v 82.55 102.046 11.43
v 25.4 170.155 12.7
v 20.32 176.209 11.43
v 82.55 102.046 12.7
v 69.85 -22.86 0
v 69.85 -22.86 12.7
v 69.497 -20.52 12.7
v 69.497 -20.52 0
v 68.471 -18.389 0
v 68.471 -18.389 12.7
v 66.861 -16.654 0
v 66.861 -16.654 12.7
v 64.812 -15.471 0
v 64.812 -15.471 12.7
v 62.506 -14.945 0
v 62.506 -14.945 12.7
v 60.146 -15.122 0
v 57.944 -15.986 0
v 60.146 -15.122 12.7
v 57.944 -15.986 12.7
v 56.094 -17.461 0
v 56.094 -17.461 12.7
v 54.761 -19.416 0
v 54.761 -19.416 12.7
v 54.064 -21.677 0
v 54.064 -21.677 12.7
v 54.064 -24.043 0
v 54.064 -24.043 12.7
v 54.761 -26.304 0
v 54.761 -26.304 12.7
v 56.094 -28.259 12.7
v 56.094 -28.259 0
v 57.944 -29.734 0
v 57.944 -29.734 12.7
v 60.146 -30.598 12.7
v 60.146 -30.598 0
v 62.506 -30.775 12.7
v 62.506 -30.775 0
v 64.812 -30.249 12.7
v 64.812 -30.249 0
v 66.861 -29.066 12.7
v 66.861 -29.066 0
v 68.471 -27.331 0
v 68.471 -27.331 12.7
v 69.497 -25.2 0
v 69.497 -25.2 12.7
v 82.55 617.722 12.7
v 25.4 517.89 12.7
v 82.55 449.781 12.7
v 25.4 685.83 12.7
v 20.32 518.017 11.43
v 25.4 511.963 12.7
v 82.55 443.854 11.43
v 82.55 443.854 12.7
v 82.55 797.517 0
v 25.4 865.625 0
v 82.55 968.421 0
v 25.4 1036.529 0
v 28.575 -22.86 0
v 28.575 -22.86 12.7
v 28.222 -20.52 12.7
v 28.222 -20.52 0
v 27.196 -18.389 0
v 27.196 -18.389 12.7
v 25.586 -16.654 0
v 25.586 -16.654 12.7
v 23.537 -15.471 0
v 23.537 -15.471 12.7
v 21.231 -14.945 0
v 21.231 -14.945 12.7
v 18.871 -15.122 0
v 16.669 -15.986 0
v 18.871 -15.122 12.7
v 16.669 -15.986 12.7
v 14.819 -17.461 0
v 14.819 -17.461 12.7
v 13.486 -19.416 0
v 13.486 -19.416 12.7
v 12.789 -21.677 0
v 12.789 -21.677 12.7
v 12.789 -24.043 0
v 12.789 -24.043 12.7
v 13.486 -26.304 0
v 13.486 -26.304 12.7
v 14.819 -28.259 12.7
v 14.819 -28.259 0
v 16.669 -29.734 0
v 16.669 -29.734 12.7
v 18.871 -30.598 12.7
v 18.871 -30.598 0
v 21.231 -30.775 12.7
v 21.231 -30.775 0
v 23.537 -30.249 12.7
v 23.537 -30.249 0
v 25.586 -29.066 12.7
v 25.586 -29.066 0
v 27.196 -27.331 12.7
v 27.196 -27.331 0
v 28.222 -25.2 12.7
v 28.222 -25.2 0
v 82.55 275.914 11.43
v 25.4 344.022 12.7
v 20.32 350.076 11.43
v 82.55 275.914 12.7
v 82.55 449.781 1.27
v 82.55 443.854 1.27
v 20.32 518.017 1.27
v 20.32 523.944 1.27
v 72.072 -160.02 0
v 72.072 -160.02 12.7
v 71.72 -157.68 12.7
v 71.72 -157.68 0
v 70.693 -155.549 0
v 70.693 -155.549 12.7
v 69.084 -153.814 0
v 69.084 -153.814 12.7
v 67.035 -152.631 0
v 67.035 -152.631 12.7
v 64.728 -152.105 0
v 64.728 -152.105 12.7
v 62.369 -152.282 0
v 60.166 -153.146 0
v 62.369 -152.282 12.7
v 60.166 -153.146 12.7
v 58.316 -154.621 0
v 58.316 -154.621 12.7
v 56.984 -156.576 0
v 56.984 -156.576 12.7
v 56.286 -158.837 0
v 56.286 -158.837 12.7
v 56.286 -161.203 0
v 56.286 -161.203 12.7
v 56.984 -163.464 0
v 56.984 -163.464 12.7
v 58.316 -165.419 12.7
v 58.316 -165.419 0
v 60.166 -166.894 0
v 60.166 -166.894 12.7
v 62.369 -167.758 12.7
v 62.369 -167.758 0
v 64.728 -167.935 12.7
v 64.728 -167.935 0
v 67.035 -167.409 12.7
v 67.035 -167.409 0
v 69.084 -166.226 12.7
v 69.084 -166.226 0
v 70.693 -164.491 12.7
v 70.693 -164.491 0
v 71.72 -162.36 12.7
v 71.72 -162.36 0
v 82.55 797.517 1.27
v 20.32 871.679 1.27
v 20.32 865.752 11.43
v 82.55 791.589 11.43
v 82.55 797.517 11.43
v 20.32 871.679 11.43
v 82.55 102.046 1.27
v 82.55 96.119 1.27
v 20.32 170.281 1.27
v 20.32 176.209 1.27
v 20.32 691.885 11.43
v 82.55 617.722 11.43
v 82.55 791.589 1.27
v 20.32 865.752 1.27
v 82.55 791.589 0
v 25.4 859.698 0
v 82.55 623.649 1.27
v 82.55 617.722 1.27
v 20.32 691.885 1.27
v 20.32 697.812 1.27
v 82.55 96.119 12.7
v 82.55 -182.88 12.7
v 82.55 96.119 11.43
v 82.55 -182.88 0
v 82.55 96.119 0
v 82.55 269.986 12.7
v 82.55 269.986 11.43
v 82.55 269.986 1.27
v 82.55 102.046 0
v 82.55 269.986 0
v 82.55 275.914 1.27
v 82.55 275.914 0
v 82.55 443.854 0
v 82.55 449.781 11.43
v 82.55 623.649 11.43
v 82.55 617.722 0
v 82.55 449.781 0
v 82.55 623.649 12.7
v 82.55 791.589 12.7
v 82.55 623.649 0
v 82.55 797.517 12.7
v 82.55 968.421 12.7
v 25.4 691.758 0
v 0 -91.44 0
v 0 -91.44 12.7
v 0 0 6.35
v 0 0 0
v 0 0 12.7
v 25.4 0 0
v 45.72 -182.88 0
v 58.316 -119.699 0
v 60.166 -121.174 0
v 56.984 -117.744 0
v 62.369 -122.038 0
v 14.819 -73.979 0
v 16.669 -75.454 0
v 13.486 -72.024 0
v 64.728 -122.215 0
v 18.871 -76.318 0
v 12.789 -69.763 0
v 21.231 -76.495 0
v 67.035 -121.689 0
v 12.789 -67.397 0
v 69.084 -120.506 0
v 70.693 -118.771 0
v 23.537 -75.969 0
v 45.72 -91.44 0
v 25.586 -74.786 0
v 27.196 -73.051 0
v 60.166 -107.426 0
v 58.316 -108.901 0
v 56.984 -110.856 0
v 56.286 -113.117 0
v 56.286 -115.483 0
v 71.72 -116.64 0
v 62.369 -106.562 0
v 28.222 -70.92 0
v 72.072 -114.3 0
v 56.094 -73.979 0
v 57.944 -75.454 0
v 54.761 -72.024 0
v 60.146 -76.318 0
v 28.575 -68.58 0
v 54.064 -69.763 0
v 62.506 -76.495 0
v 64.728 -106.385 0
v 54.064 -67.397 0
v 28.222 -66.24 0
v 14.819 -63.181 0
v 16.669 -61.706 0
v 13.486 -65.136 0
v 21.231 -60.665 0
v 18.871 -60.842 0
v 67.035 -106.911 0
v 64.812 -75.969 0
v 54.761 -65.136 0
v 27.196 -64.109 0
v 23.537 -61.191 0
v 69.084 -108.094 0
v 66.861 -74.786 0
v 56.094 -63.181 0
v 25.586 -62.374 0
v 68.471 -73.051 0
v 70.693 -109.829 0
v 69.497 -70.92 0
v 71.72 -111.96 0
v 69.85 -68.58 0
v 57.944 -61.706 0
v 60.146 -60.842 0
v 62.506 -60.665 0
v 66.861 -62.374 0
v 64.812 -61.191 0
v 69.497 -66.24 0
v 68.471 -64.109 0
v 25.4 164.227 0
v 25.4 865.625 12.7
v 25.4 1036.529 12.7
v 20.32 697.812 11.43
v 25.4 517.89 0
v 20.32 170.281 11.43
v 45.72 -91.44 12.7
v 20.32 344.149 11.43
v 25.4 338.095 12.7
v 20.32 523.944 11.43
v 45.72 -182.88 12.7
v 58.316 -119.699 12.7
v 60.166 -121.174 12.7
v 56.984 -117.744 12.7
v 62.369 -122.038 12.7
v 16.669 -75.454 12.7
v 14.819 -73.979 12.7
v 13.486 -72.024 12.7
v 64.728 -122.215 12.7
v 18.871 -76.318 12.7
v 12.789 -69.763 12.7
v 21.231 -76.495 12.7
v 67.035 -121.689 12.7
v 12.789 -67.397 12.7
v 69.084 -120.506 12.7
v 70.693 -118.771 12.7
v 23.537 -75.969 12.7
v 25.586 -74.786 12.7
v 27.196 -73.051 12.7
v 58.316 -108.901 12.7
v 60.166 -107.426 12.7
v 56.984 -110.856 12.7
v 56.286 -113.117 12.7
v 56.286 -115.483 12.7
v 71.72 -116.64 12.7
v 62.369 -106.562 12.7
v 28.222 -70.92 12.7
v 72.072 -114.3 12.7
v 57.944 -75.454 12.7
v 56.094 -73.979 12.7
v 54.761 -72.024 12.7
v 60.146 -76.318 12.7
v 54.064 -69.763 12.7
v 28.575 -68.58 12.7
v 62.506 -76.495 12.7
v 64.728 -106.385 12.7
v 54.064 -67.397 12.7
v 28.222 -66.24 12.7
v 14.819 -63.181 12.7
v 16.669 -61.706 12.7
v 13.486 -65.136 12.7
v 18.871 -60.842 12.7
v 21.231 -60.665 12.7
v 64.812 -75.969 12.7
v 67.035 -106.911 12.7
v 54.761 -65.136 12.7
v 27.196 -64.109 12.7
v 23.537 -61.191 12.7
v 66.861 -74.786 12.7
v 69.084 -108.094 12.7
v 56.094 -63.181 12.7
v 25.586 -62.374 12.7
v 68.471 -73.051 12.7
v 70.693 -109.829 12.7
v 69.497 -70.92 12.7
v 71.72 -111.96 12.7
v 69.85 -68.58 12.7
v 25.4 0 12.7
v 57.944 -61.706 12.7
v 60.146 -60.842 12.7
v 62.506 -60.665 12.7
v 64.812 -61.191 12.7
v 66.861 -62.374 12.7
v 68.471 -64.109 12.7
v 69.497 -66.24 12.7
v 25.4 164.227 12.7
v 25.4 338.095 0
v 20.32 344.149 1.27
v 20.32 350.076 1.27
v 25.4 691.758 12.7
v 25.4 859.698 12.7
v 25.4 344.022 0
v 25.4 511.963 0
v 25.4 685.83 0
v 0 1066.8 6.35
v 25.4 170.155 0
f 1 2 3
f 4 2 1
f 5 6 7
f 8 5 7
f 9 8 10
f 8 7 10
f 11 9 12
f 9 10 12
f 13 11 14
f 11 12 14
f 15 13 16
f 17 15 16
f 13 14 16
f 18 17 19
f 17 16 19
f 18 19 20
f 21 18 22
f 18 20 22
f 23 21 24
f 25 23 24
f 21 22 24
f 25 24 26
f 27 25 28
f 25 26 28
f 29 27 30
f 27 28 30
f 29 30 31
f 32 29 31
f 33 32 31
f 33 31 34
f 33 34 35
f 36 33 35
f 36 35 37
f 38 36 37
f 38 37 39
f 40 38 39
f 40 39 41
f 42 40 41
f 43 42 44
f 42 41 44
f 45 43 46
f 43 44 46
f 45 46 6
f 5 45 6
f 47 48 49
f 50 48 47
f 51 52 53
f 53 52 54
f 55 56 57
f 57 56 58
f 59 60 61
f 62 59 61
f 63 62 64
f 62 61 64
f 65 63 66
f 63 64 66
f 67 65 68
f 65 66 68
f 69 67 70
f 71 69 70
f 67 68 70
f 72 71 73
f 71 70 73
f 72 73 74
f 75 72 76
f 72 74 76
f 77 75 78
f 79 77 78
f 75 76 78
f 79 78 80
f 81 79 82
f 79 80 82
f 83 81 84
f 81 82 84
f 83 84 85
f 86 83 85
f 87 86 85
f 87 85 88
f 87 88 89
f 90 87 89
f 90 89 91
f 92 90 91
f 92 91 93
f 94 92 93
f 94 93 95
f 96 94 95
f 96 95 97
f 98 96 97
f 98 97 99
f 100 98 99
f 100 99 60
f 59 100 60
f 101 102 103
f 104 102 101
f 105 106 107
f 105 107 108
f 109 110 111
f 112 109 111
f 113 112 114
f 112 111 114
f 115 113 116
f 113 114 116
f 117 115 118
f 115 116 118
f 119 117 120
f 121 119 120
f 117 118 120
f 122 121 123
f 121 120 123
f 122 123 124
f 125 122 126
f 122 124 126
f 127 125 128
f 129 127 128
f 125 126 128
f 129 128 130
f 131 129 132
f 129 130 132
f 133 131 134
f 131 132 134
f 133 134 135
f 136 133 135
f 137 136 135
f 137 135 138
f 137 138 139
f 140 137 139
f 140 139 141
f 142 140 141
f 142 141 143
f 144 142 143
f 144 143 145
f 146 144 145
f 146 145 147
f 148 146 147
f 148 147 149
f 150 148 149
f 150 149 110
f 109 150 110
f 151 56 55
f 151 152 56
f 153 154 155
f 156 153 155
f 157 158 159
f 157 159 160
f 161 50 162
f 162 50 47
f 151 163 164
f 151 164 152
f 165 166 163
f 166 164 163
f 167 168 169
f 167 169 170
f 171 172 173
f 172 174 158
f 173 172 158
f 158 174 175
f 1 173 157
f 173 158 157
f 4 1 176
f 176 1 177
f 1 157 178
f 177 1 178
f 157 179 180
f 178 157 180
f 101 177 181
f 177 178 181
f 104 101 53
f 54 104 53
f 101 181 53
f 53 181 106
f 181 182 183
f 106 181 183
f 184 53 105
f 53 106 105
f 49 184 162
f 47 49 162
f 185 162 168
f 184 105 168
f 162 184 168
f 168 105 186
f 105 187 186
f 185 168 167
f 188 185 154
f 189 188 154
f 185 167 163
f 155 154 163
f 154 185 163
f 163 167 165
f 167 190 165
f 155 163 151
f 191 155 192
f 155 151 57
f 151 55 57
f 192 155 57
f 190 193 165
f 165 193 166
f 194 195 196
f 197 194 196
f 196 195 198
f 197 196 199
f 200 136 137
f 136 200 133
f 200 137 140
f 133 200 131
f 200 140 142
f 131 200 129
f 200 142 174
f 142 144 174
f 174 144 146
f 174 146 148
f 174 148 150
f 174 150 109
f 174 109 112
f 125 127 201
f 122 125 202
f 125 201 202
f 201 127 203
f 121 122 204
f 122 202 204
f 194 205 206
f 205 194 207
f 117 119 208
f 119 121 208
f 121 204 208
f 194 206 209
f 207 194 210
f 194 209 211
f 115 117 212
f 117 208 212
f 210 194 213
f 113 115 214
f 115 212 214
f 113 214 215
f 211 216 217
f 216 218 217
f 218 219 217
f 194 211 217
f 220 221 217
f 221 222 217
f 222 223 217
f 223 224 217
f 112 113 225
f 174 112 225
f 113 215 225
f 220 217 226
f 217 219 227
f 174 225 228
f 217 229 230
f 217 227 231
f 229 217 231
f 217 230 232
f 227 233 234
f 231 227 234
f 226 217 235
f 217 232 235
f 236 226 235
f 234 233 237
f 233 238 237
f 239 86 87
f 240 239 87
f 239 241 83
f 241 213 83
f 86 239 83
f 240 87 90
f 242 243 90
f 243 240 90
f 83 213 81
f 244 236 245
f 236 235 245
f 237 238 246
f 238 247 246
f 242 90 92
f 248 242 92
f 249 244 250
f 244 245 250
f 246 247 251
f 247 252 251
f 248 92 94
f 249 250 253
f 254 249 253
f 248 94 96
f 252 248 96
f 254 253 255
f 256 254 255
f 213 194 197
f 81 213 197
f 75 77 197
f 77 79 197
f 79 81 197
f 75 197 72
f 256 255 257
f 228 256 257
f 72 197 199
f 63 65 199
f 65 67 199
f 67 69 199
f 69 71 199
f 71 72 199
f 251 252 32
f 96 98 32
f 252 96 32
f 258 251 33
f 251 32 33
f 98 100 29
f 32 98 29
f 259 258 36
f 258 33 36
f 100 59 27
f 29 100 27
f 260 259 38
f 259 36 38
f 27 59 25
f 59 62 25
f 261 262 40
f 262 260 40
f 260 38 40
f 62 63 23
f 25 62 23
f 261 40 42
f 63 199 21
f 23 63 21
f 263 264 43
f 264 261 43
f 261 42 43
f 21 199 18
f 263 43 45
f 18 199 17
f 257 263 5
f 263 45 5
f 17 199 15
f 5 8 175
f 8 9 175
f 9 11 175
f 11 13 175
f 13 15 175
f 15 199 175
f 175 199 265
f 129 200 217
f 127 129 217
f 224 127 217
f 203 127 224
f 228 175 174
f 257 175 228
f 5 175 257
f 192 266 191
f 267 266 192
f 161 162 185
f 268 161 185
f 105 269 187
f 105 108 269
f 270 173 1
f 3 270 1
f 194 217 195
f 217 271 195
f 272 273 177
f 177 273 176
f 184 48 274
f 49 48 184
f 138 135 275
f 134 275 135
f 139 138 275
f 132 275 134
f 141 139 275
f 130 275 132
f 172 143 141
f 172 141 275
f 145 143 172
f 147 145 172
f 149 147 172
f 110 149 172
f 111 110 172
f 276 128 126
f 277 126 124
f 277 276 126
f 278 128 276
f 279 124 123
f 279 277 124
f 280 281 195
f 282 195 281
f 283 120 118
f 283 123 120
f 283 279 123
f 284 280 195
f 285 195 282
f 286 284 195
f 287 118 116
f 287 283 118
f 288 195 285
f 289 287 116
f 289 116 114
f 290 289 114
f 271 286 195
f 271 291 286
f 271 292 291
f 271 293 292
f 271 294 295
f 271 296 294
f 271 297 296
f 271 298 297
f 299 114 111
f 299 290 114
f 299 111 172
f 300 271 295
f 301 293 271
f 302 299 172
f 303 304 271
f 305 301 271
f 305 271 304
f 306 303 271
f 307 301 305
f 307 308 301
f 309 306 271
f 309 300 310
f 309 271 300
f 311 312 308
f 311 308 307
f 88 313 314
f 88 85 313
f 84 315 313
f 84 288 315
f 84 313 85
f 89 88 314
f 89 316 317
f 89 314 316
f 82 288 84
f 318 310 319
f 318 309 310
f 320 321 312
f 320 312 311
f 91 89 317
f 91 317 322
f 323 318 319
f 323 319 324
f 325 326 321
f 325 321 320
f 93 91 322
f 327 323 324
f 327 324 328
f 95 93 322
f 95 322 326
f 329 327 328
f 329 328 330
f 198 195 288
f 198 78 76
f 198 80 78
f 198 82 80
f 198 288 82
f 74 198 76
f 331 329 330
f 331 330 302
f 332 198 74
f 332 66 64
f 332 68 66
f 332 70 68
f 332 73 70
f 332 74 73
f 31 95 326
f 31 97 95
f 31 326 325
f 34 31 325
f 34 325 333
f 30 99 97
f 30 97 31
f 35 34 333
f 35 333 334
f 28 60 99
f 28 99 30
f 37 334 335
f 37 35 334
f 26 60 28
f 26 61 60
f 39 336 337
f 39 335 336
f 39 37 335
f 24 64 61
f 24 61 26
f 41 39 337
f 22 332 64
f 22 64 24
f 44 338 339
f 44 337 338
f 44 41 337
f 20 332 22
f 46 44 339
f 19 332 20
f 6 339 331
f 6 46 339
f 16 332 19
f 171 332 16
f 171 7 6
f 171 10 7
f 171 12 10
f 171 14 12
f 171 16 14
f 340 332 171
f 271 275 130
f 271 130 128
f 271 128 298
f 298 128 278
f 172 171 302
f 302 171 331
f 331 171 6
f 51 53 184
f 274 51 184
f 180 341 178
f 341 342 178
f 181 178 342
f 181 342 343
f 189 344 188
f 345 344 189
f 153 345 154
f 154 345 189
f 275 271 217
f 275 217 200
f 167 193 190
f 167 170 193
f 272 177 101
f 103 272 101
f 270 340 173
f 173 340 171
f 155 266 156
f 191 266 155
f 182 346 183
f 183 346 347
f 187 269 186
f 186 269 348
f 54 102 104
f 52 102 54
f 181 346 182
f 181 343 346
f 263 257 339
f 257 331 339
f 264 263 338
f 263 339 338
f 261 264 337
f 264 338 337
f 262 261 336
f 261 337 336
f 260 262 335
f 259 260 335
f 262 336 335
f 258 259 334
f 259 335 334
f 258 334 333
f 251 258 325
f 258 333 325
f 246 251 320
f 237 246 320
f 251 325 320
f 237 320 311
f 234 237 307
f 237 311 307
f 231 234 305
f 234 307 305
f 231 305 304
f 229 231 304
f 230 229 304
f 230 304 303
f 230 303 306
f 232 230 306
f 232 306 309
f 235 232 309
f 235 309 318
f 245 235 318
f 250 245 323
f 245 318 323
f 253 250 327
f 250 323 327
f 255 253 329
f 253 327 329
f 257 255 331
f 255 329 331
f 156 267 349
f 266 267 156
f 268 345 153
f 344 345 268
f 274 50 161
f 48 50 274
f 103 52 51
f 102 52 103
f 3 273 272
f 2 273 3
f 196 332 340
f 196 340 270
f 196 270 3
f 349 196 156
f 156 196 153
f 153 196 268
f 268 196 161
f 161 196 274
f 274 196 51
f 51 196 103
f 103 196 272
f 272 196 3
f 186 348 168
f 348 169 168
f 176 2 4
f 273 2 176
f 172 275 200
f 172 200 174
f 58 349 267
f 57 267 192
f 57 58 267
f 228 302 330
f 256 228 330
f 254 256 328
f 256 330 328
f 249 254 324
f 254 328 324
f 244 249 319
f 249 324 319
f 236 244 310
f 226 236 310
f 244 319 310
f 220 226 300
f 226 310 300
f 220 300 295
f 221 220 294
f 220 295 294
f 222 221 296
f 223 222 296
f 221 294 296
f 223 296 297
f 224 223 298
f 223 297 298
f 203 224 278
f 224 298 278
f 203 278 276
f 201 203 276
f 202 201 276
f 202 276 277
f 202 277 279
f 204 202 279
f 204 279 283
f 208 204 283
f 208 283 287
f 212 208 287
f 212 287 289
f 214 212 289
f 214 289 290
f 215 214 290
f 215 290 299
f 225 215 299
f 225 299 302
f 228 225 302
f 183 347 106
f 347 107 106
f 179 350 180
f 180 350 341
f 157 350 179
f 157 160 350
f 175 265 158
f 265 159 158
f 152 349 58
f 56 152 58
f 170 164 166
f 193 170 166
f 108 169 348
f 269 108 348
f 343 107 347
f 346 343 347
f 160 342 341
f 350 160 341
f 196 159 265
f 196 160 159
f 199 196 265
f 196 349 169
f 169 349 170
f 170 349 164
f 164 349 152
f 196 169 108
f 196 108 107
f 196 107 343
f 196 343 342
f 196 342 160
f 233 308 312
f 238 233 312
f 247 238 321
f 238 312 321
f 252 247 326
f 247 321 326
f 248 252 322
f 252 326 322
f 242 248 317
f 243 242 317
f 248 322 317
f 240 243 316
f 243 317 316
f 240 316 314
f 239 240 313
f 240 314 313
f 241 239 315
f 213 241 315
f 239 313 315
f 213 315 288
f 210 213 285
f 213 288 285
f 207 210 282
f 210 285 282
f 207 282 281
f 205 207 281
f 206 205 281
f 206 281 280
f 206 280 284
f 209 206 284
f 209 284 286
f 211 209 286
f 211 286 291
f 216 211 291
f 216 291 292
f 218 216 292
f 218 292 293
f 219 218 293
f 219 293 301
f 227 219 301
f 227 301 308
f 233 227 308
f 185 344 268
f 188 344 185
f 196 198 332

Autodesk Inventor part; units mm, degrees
ref_plane "YZ Plane" through (0, 0, 0) normal (1, 0, 0) x (0, 1, 0)
ref_plane "XZ Plane" through (0, 0, 0) normal (0, 1, 0) x (-1, 0, 0)
ref_plane "XY Plane" through (0, 0, 0) normal (0, 0, 1) x (1, 0, 0)
sketch "Sketch1" plane through (0, 0, 0) normal (0, 0, 1) x (1, 0, 0)
  line L0 (0, 0) -> (82.55, 0)
  line L1 (82.55, 0) -> (82.55, 968.4207)
  line L2 (82.55, 968.4207) -> (82.55, 804.8513)
  line L3 (82.55, 804.8513) -> (82.55, 621.9713)
  line L4 (82.55, 621.9713) -> (82.55, 439.0913)
  line L5 (82.55, 439.0913) -> (82.55, 256.2113)
  line L6 (82.55, 256.2113) -> (82.55, 73.3313)
  line L7 (0, 1066.8) -> (0, 0)
  line L8 (0, 1066.8) -> (82.55, 968.4207)
  line L9 (-23.6845, 1095.0261) -> (784.1067, 132.338)
  line L10 (-109.2976, 1023.1881) -> (698.4936, 60.5001)
  line L11 (-194.9107, 951.3502) -> (612.8804, -11.3378)
  line L12 (-280.5239, 879.5122) -> (527.2673, -83.1758)
  line L13 (-366.137, 807.6743) -> (441.6542, -155.0137)
  line L14 (-451.7501, 735.8363) -> (356.041, -226.8517)
  dimension "d26" = 1066.8
  dimension "d27" = 82.55
  dimension "d28" = 40
  dimension "d34" = 111.76
  dimension "d35" = 111.76
  dimension "d36" = 111.76
  dimension "d37" = 111.76
  dimension "d38" = 111.76
extrude "Extrusion1" add sketch "Sketch1" along normal blind 12.7
sketch "Sketch2" plane through (0, 0, 12.7) normal (0, 0, 1) x (1, 0, 0)
  line L0 (0, 0) -> (82.55, 0)
  line L1 (82.55, 0) -> (82.55, 968.4207)
  line L2 (82.55, 968.4207) -> (82.55, 804.8513)
  line L3 (82.55, 804.8513) -> (82.55, 621.9713)
  line L4 (82.55, 621.9713) -> (82.55, 439.0913)
  line L5 (82.55, 439.0913) -> (82.55, 256.2113)
  line L6 (82.55, 256.2113) -> (82.55, 73.3313)
  line L7 (0, 1066.8) -> (0, 0)
  line L8 (0, 1066.8) -> (82.55, 968.4207)
  line L9 (-23.6845, 1095.0261) -> (784.1067, 132.338)
  line L10 (-109.2976, 1023.1881) -> (698.4936, 60.5001)
  line L11 (-194.9107, 951.3502) -> (612.8804, -11.3378)
  line L12 (-280.5239, 879.5122) -> (527.2673, -83.1758)
  line L13 (-366.137, 807.6743) -> (441.6542, -155.0137)
  line L14 (-451.7501, 735.8363) -> (356.041, -226.8517)
  line L15 (-453.2094, 734.6118) -> (354.5817, -228.0762)
  line L16 (-450.2908, 737.0609) -> (357.5004, -225.6272)
  line L17 (-367.5963, 806.4498) -> (440.1949, -156.2382)
  line L18 (-364.6777, 808.8988) -> (443.1135, -153.7892)
  line L19 (-281.9832, 878.2877) -> (525.808, -84.4003)
  line L20 (-279.0645, 880.7367) -> (528.7266, -81.9513)
  line L21 (-196.37, 950.1257) -> (611.4211, -12.5624)
  line L22 (-193.4514, 952.5747) -> (614.3397, -10.1133)
  line L23 (-110.7569, 1021.9636) -> (697.0342, 59.2756)
  line L24 (-107.8383, 1024.4126) -> (699.9529, 61.7246)
  point P0 (0, 889.9687)
  point P1 (82.55, 791.5894)
  point P2 (82.55, 797.5167)
  point P3 (0, 895.896)
  point P4 (0, 716.101)
  point P5 (82.55, 617.7217)
  point P6 (82.55, 623.649)
  point P7 (0, 722.0283)
  point P8 (0, 542.2333)
  point P9 (82.55, 443.854)
  point P10 (82.55, 449.7813)
  point P11 (0, 548.1606)
  point P12 (0, 368.3656)
  point P13 (82.55, 269.9863)
  point P14 (82.55, 275.9136)
  point P15 (0, 374.2929)
  point P16 (0, 194.4979)
  point P17 (82.55, 96.1186)
  point P18 (82.55, 102.0459)
  point P19 (0, 200.4252)
  dimension "d41" = 1066.8
  dimension "d42" = 82.55
  dimension "d43" = 40
  dimension "d44" = 111.76
  dimension "d45" = 111.76
  dimension "d46" = 111.76
  dimension "d47" = 111.76
  dimension "d48" = 111.76
  dimension "d49" = 1.905
  dimension "d50" = 1.905
  dimension "d51" = 1.905
  dimension "d52" = 1.905
  dimension "d53" = 1.905
  dimension "d54" = 1.905
  dimension "d55" = 1.905
  dimension "d56" = 1.905
  dimension "d57" = 1.905
  dimension "d58" = 1.905
extrude "Extrusion2" cut sketch "Sketch2" against normal blind 12.7 contours L7 L14 L1 L15 | L7 L16 L1 L14 | L7 L13 L1 L17 | L7 L18 L1 L13 | L7 L12 L1 L19 | L7 L20 L1 L12 | L7 L11 L1 L21 | L7 L22 L1 L11 | L7 L10 L1 L23 | L7 L24 L1 L10
sketch "Sketch3" plane through (0, 0, 12.7) normal (0, 0, 1) x (1, 0, 0)
  line L0 (0, 0) -> (82.55, 0)
  line L1 (82.55, 0) -> (82.55, 968.4207)
  line L2 (82.55, 968.4207) -> (82.55, 804.8513)
  line L3 (82.55, 804.8513) -> (82.55, 621.9713)
  line L4 (82.55, 621.9713) -> (82.55, 439.0913)
  line L5 (82.55, 439.0913) -> (82.55, 256.2113)
  line L6 (82.55, 256.2113) -> (82.55, 73.3313)
  line L7 (0, 1066.8) -> (0, 0)
  line L8 (0, 1066.8) -> (82.55, 968.4207)
  line L9 (-23.6845, 1095.0261) -> (784.1067, 132.338)
  line L10 (-109.2976, 1023.1881) -> (698.4936, 60.5001)
  line L11 (-194.9107, 951.3502) -> (612.8804, -11.3378)
  line L12 (-280.5239, 879.5122) -> (527.2673, -83.1758)
  line L13 (-366.137, 807.6743) -> (441.6542, -155.0137)
  line L14 (-451.7501, 735.8363) -> (356.041, -226.8517)
  line L15 (-453.2094, 734.6118) -> (354.5817, -228.0762)
  line L16 (-450.2908, 737.0609) -> (357.5004, -225.6272)
  line L17 (-367.5963, 806.4498) -> (440.1949, -156.2382)
  line L18 (-364.6777, 808.8988) -> (443.1135, -153.7892)
  line L19 (-281.9832, 878.2877) -> (525.808, -84.4003)
  line L20 (-279.0645, 880.7367) -> (528.7266, -81.9513)
  line L21 (-196.37, 950.1257) -> (611.4211, -12.5624)
  line L22 (-193.4514, 952.5747) -> (614.3397, -10.1133)
  line L23 (-110.7569, 1021.9636) -> (697.0342, 59.2756)
  line L24 (-107.8383, 1024.4126) -> (699.9529, 61.7246)
  point P0 (0, 889.9687)
  point P1 (82.55, 791.5894)
  point P2 (82.55, 797.5167)
  point P3 (0, 895.896)
  point P4 (0, 716.101)
  point P5 (82.55, 617.7217)
  point P6 (82.55, 623.649)
  point P7 (0, 722.0283)
  point P8 (0, 542.2333)
  point P9 (82.55, 443.854)
  point P10 (82.55, 449.7813)
  point P11 (0, 548.1606)
  point P12 (0, 368.3656)
  point P13 (82.55, 269.9863)
  point P14 (82.55, 275.9136)
  point P15 (0, 374.2929)
  point P16 (0, 194.4979)
  point P17 (82.55, 96.1186)
  point P18 (82.55, 102.0459)
  point P19 (0, 200.4252)
  point P20 (0, 889.9687)
  point P21 (82.55, 791.5894)
  point P22 (82.55, 797.5167)
  point P23 (0, 895.896)
  point P24 (0, 716.101)
  point P25 (82.55, 617.7217)
  point P26 (82.55, 623.649)
  point P27 (0, 722.0283)
  point P28 (0, 542.2333)
  point P29 (82.55, 443.854)
  point P30 (82.55, 449.7813)
  point P31 (0, 548.1606)
  point P32 (0, 368.3656)
  point P33 (82.55, 269.9863)
  point P34 (82.55, 275.9136)
  point P35 (0, 374.2929)
  point P36 (0, 194.4979)
  point P37 (82.55, 96.1186)
  point P38 (82.55, 102.0459)
  point P39 (0, 200.4252)
  dimension "d114" = 15.875
  dimension "d61" = 1066.8
  dimension "d62" = 82.55
  dimension "d63" = 40
  dimension "d64" = 111.76
  dimension "d65" = 111.76
  dimension "d66" = 111.76
  dimension "d67" = 111.76
  dimension "d68" = 111.76
  dimension "d69" = 1.905
  dimension "d70" = 1.905
  dimension "d71" = 1.905
  dimension "d72" = 1.905
  dimension "d73" = 1.905
  dimension "d74" = 1.905
  dimension "d75" = 1.905
  dimension "d76" = 1.905
  dimension "d77" = 1.905
  dimension "d78" = 1.905
extrude "Extrusion3" add sketch "Sketch3" against normal blind 11.43 contours L7 L14 L1 L15 | L7 L16 L1 L14 | L7 L13 L1 L17 | L7 L18 L1 L13 | L7 L12 L1 L19 | L7 L20 L1 L12 | L7 L11 L1 L21 | L7 L22 L1 L11 | L7 L10 L1 L23 | L7 L24 L1 L10
sketch "Sketch4" plane through (0, 0, 12.7) normal (0, 0, 1) x (1, 0, 0)
  line L0 (0, 0) -> (82.55, 0)
  line L1 (82.55, 0) -> (82.55, 968.4207)
  line L2 (82.55, 968.4207) -> (82.55, 804.8513)
  line L3 (82.55, 804.8513) -> (82.55, 621.9713)
  line L4 (82.55, 621.9713) -> (82.55, 439.0913)
  line L5 (82.55, 439.0913) -> (82.55, 256.2113)
  line L6 (82.55, 256.2113) -> (82.55, 73.3313)
  line L7 (0, 1066.8) -> (0, 0)
  line L8 (0, 1066.8) -> (82.55, 968.4207)
  line L9 (-23.6845, 1095.0261) -> (784.1067, 132.338)
  line L10 (-109.2976, 1023.1881) -> (698.4936, 60.5001)
  line L11 (-194.9107, 951.3502) -> (612.8804, -11.3378)
  line L12 (-280.5239, 879.5122) -> (527.2673, -83.1758)
  line L13 (-366.137, 807.6743) -> (441.6542, -155.0137)
  line L14 (-451.7501, 735.8363) -> (356.041, -226.8517)
  line L15 (-453.2094, 734.6118) -> (354.5817, -228.0762)
  line L16 (-450.2908, 737.0609) -> (357.5004, -225.6272)
  line L17 (-367.5963, 806.4498) -> (440.1949, -156.2382)
  line L18 (-364.6777, 808.8988) -> (443.1135, -153.7892)
  line L19 (-281.9832, 878.2877) -> (525.808, -84.4003)
  line L20 (-279.0645, 880.7367) -> (528.7266, -81.9513)
  line L21 (-196.37, 950.1257) -> (611.4211, -12.5624)
  line L22 (-193.4514, 952.5747) -> (614.3397, -10.1133)
  line L23 (-110.7569, 1021.9636) -> (697.0342, 59.2756)
  line L24 (-107.8383, 1024.4126) -> (699.9529, 61.7246)
  point P0 (0, 889.9687)
  point P1 (82.55, 791.5894)
  point P2 (82.55, 797.5167)
  point P3 (0, 895.896)
  point P4 (0, 716.101)
  point P5 (82.55, 617.7217)
  point P6 (82.55, 623.649)
  point P7 (0, 722.0283)
  point P8 (0, 542.2333)
  point P9 (82.55, 443.854)
  point P10 (82.55, 449.7813)
  point P11 (0, 548.1606)
  point P12 (0, 368.3656)
  point P13 (82.55, 269.9863)
  point P14 (82.55, 275.9136)
  point P15 (0, 374.2929)
  point P16 (0, 194.4979)
  point P17 (82.55, 96.1186)
  point P18 (82.55, 102.0459)
  point P19 (0, 200.4252)
  point P20 (0, 889.9687)
  point P21 (82.55, 791.5894)
  point P22 (82.55, 797.5167)
  point P23 (0, 895.896)
  point P24 (0, 716.101)
  point P25 (82.55, 617.7217)
  point P26 (82.55, 623.649)
  point P27 (0, 722.0283)
  point P28 (0, 542.2333)
  point P29 (82.55, 443.854)
  point P30 (82.55, 449.7813)
  point P31 (0, 548.1606)
  point P32 (0, 368.3656)
  point P33 (82.55, 269.9863)
  point P34 (82.55, 275.9136)
  point P35 (0, 374.2929)
  point P36 (0, 194.4979)
  point P37 (82.55, 96.1186)
  point P38 (82.55, 102.0459)
  point P39 (0, 200.4252)
  dimension "d81" = 1066.8
  dimension "d82" = 82.55
  dimension "d83" = 40
  dimension "d84" = 111.76
  dimension "d85" = 111.76
  dimension "d86" = 111.76
  dimension "d87" = 111.76
  dimension "d88" = 111.76
  dimension "d89" = 1.905
  dimension "d90" = 1.905
  dimension "d91" = 1.905
  dimension "d92" = 1.905
  dimension "d93" = 1.905
  dimension "d94" = 1.905
  dimension "d95" = 1.905
  dimension "d96" = 1.905
  dimension "d97" = 1.905
  dimension "d98" = 1.905
extrude "Extrusion4" cut sketch "Sketch4" against normal blind 1.27 contours L7 L14 L1 L15 | L7 L16 L1 L14 | L7 L13 L1 L17 | L7 L18 L1 L13 | L7 L12 L1 L19 | L7 L20 L1 L12 | L7 L11 L1 L21 | L7 L22 L1 L11 | L7 L10 L1 L23 | L7 L24 L1 L10
sketch "Sketch5" plane through (0, 0, 0) normal (0, -1, 0) x (1, 0, 0)
  line L0 (0, 12.7) -> (82.55, 12.7) projected
  line L1 (0, 12.7) -> (25.4, 12.7)
  line L2 (25.4, 12.7) -> (0, 6.35)
  line L3 (0, 0) -> (0, 12.7) projected
  line L4 (0, 6.35) -> (25.4, 0)
  line L5 (0, 0) -> (82.55, 0) projected
  dimension "d101" = 25.4
extrude "Extrusion5" cut sketch "Sketch5" against normal through all
sketch "Sketch6" plane through (0, 0, 12.7) normal (0, 0, 1) x (1, 0, 0)
  line L0 (25.4, 164.2273) -> (25.4, 0) projected
  line L1 (25.4, 0) -> (82.55, 0) projected
  line L2 (82.55, 0) -> (82.55, 96.1186) projected
  line L3 (82.55, 96.1186) -> (25.4, 164.2273) projected
  line L4 (0, 0) -> (82.55, 0)
  line L5 (82.55, 0) -> (82.55, -91.44)
  line L6 (82.55, -91.44) -> (0, -91.44)
  line L7 (0, -91.44) -> (0, 0)
  line L8 (0, -91.44) -> (45.72, -91.44)
  line L9 (45.72, -91.44) -> (45.72, -182.88)
  line L10 (82.55, -91.44) -> (45.72, -91.44)
  line L11 (45.72, -91.44) -> (45.72, -182.88)
  line L12 (45.72, -182.88) -> (82.55, -182.88)
  line L13 (82.55, -182.88) -> (82.55, -91.44)
  line L14 (0, -45.72) -> (82.55, -45.72)
  line L15 (25.4, 0) -> (82.55, 0) projected
  line L16 (41.275, 0) -> (41.275, -91.44)
  line L17 (45.72, -137.16) -> (82.55, -137.16)
  line L18 (0, -91.44) -> (0, -45.72)
  line L19 (0, -91.44) -> (41.275, -91.44)
  line L20 (41.275, -91.44) -> (82.55, -91.44)
  line L21 (82.55, -91.44) -> (82.55, -45.72)
  line L22 (82.55, -45.72) -> (82.55, 0)
  line L23 (82.55, 0) -> (41.275, 0)
  line L24 (25.4, 0) -> (0, 0) projected
  line L25 (41.275, 0) -> (0, 0)
  line L26 (82.55, -91.44) -> (82.55, -137.16)
  line L27 (45.72, -137.16) -> (45.72, -182.88)
  circle A0 centre (20.6375, -22.86) radius 7.9375
  circle A1 centre (61.9125, -22.86) radius 7.9375
  circle A2 centre (61.9125, -68.58) radius 7.9375
  circle A3 centre (20.6375, -68.58) radius 7.9375
  circle A4 centre (64.135, -114.3) radius 7.9375
  circle A5 centre (64.135, -160.02) radius 7.9375
  dimension "d104" = 91.44
  dimension "d106" = 91.44
  dimension "d107" = 45.72
  dimension "d108" = 91.44
  dimension "d109" = 36.83
  dimension "d110" = 15.875
  dimension "d111" = 15.875
  dimension "d112" = 15.875
  dimension "d113" = 15.875
  dimension "d114" = 15.875
  dimension "d115" = 15.875
extrude "Extrusion6" add sketch "Sketch6" against normal blind 12.7 contours L1 L16 L14 L7 L4 | L1 L5 L14 L16 | L16 L6 L7 L14 | L14 L5 L6 L16 | L13 L17 L9 L6 | L13 L12 L9 L17
properties part number "blade D 3.25"
